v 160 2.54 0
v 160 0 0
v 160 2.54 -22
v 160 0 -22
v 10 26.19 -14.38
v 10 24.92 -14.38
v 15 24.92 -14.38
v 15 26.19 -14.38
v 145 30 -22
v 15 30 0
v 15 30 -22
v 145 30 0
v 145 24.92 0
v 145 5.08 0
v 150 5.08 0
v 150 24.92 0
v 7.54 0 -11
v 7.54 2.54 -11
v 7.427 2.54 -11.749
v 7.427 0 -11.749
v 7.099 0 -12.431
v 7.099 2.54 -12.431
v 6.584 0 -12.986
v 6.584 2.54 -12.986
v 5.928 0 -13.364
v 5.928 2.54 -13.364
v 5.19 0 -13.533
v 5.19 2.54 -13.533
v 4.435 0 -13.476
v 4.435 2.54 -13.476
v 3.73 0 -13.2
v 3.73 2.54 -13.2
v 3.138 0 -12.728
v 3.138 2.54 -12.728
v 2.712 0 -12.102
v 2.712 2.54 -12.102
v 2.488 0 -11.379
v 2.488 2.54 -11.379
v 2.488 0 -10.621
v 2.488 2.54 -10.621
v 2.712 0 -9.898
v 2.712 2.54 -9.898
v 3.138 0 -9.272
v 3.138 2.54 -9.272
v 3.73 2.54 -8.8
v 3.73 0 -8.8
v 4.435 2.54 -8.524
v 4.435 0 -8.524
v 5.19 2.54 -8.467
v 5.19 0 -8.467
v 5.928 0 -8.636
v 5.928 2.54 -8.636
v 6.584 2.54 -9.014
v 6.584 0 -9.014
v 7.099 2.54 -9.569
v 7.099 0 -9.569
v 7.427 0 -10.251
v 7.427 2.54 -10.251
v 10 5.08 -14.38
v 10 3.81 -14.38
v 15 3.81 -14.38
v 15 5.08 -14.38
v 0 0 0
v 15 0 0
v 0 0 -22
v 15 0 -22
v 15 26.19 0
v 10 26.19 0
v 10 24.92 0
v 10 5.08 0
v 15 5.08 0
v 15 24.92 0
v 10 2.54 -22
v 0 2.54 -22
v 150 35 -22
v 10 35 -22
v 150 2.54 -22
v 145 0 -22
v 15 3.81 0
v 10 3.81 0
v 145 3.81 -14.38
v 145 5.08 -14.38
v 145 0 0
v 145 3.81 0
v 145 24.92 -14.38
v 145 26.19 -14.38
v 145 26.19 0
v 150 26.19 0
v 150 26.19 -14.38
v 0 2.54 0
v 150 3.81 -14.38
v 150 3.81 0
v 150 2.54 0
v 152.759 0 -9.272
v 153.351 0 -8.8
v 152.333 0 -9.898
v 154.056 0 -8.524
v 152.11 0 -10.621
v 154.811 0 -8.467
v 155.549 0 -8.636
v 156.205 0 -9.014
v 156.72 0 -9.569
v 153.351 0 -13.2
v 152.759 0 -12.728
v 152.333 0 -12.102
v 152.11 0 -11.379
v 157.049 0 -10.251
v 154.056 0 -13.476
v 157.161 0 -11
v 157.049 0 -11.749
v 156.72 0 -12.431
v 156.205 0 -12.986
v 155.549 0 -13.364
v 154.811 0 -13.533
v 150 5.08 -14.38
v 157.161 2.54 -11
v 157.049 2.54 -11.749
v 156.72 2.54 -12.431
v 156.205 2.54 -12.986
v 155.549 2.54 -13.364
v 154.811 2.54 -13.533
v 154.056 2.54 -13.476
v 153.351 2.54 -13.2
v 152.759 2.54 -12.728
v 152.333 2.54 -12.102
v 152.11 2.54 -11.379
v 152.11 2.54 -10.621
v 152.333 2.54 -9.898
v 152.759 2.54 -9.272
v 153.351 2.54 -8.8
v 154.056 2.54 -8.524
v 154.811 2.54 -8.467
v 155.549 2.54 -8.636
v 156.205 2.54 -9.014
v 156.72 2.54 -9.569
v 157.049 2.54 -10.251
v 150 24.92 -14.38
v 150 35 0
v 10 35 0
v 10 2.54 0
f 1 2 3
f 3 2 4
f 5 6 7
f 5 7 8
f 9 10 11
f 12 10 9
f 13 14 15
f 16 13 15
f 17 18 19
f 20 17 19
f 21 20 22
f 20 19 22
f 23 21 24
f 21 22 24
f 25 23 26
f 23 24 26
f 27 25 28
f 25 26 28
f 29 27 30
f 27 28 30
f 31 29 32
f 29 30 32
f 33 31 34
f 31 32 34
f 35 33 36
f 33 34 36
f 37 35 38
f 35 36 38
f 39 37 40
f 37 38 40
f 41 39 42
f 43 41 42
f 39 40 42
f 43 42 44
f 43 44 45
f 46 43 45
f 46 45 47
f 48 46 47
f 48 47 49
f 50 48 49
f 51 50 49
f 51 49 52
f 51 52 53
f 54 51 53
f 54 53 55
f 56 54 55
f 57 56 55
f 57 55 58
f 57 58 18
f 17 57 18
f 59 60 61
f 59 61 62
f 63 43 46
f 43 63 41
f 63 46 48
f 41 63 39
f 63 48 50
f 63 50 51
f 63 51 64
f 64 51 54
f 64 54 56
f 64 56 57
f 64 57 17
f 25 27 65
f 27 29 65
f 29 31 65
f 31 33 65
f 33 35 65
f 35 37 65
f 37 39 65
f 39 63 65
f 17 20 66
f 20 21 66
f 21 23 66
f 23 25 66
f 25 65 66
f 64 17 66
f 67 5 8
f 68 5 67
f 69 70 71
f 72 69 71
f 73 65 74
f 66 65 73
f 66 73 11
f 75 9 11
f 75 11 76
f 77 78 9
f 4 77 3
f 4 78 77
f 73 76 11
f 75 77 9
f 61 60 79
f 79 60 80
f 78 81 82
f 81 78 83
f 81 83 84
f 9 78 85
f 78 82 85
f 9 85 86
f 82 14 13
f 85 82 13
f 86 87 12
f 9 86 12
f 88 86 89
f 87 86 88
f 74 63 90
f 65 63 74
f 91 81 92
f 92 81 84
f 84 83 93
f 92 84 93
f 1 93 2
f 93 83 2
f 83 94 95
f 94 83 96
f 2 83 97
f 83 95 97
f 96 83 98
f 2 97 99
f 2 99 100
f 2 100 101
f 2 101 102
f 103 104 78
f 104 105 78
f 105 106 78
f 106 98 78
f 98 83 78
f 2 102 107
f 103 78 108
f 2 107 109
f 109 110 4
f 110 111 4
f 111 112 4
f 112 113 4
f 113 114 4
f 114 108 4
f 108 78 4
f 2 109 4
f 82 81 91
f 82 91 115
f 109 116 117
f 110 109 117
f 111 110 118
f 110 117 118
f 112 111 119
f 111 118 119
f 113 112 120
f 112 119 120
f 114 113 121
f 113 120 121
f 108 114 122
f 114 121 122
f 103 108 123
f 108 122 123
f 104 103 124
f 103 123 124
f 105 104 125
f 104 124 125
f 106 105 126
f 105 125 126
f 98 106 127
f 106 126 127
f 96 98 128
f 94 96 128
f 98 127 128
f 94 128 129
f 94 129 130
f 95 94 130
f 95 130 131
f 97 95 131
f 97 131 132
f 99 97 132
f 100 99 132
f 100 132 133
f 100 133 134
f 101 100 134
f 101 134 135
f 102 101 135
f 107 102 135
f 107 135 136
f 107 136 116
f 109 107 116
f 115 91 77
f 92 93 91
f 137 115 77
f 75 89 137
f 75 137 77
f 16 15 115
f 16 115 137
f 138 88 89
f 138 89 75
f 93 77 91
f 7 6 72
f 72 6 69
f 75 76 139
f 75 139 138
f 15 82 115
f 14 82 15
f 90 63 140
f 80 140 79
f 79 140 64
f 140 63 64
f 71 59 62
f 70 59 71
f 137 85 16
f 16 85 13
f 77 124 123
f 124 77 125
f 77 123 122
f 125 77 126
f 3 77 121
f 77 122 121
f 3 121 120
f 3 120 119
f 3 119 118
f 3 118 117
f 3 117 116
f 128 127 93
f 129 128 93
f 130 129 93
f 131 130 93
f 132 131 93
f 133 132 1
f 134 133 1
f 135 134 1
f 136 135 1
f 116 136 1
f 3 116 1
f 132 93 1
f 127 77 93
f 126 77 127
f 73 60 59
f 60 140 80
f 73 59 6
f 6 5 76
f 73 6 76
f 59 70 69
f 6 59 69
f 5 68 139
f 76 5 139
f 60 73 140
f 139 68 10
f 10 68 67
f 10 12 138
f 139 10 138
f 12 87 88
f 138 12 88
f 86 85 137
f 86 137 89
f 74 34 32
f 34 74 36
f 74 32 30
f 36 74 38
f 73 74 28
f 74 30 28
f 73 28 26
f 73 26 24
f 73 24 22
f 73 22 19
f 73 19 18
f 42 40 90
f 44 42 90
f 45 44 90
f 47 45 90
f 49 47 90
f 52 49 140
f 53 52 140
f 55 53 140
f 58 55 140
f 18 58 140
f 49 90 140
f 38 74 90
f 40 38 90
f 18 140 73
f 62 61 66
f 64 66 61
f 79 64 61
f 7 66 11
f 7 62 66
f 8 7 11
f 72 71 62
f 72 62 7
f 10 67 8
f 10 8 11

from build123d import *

# Parameters (mm, degrees)
SKETCH1_W           = 160
SKETCH1_H           = 22
BOSS_EXTRUDE1_DEPTH = 35
SKETCH4_W           = 130
SKETCH4_H           = 30
CUT_EXTRUDE3_DEPTH  = 23
SKETCH5_W           = 10
SKETCH5_H           = 32.46
CUT_EXTRUDE4_DEPTH  = 23
SKETCH7_W           = 14.38
SKETCH7_H           = 1.27
CUT_EXTRUDE5_DEPTH  = 151
SKETCH8_R           = 2.54
CUT_EXTRUDE6_DEPTH  = 3.54


with BuildPart() as part:
    # Sketch1 → Boss-Extrude1 (new body)
    with BuildSketch(Plane(origin=(0, 0, 0), x_dir=(1, 0, 0), z_dir=(0, 1, 0))):
        with Locations((80, 11)):
            Rectangle(SKETCH1_W, SKETCH1_H)
    extrude(amount=BOSS_EXTRUDE1_DEPTH)

    # Sketch4 → Cut-Extrude3 (cut, through all)
    with BuildSketch(Plane.XY):
        with Locations((80, 15)):
            Rectangle(SKETCH4_W, SKETCH4_H)
    extrude(amount=-CUT_EXTRUDE3_DEPTH, mode=Mode.SUBTRACT)

    # Sketch5 → Cut-Extrude4 (cut, through all)
    with BuildSketch(Plane.XY):
        with Locations((5, 18.77)):
            Rectangle(SKETCH5_W, SKETCH5_H)
        with Locations((155, 18.77)):
            Rectangle(SKETCH5_W, SKETCH5_H)
    extrude(amount=-CUT_EXTRUDE4_DEPTH, mode=Mode.SUBTRACT)

    # Sketch7 → Cut-Extrude5 (cut, through all)
    with BuildSketch(Plane.ZY.offset(-10)):
        with Locations((-7.19, 4.445)):
            Rectangle(SKETCH7_W, SKETCH7_H)
        with Locations((-7.19, 25.555)):
            Rectangle(SKETCH7_W, SKETCH7_H)
    extrude(amount=-CUT_EXTRUDE5_DEPTH, mode=Mode.SUBTRACT)

    # Sketch8 → Cut-Extrude6 (cut, through all)
    with BuildSketch(Plane(origin=(0, 2.54, 0), x_dir=(1, 0, 0), z_dir=(0, 1, 0))):
        with Locations((154.621372276, 11)):
            Circle(SKETCH8_R)
        with Locations((5, 11)):
            Circle(SKETCH8_R)
    extrude(amount=-CUT_EXTRUDE6_DEPTH, mode=Mode.SUBTRACT)


solid = part.part
